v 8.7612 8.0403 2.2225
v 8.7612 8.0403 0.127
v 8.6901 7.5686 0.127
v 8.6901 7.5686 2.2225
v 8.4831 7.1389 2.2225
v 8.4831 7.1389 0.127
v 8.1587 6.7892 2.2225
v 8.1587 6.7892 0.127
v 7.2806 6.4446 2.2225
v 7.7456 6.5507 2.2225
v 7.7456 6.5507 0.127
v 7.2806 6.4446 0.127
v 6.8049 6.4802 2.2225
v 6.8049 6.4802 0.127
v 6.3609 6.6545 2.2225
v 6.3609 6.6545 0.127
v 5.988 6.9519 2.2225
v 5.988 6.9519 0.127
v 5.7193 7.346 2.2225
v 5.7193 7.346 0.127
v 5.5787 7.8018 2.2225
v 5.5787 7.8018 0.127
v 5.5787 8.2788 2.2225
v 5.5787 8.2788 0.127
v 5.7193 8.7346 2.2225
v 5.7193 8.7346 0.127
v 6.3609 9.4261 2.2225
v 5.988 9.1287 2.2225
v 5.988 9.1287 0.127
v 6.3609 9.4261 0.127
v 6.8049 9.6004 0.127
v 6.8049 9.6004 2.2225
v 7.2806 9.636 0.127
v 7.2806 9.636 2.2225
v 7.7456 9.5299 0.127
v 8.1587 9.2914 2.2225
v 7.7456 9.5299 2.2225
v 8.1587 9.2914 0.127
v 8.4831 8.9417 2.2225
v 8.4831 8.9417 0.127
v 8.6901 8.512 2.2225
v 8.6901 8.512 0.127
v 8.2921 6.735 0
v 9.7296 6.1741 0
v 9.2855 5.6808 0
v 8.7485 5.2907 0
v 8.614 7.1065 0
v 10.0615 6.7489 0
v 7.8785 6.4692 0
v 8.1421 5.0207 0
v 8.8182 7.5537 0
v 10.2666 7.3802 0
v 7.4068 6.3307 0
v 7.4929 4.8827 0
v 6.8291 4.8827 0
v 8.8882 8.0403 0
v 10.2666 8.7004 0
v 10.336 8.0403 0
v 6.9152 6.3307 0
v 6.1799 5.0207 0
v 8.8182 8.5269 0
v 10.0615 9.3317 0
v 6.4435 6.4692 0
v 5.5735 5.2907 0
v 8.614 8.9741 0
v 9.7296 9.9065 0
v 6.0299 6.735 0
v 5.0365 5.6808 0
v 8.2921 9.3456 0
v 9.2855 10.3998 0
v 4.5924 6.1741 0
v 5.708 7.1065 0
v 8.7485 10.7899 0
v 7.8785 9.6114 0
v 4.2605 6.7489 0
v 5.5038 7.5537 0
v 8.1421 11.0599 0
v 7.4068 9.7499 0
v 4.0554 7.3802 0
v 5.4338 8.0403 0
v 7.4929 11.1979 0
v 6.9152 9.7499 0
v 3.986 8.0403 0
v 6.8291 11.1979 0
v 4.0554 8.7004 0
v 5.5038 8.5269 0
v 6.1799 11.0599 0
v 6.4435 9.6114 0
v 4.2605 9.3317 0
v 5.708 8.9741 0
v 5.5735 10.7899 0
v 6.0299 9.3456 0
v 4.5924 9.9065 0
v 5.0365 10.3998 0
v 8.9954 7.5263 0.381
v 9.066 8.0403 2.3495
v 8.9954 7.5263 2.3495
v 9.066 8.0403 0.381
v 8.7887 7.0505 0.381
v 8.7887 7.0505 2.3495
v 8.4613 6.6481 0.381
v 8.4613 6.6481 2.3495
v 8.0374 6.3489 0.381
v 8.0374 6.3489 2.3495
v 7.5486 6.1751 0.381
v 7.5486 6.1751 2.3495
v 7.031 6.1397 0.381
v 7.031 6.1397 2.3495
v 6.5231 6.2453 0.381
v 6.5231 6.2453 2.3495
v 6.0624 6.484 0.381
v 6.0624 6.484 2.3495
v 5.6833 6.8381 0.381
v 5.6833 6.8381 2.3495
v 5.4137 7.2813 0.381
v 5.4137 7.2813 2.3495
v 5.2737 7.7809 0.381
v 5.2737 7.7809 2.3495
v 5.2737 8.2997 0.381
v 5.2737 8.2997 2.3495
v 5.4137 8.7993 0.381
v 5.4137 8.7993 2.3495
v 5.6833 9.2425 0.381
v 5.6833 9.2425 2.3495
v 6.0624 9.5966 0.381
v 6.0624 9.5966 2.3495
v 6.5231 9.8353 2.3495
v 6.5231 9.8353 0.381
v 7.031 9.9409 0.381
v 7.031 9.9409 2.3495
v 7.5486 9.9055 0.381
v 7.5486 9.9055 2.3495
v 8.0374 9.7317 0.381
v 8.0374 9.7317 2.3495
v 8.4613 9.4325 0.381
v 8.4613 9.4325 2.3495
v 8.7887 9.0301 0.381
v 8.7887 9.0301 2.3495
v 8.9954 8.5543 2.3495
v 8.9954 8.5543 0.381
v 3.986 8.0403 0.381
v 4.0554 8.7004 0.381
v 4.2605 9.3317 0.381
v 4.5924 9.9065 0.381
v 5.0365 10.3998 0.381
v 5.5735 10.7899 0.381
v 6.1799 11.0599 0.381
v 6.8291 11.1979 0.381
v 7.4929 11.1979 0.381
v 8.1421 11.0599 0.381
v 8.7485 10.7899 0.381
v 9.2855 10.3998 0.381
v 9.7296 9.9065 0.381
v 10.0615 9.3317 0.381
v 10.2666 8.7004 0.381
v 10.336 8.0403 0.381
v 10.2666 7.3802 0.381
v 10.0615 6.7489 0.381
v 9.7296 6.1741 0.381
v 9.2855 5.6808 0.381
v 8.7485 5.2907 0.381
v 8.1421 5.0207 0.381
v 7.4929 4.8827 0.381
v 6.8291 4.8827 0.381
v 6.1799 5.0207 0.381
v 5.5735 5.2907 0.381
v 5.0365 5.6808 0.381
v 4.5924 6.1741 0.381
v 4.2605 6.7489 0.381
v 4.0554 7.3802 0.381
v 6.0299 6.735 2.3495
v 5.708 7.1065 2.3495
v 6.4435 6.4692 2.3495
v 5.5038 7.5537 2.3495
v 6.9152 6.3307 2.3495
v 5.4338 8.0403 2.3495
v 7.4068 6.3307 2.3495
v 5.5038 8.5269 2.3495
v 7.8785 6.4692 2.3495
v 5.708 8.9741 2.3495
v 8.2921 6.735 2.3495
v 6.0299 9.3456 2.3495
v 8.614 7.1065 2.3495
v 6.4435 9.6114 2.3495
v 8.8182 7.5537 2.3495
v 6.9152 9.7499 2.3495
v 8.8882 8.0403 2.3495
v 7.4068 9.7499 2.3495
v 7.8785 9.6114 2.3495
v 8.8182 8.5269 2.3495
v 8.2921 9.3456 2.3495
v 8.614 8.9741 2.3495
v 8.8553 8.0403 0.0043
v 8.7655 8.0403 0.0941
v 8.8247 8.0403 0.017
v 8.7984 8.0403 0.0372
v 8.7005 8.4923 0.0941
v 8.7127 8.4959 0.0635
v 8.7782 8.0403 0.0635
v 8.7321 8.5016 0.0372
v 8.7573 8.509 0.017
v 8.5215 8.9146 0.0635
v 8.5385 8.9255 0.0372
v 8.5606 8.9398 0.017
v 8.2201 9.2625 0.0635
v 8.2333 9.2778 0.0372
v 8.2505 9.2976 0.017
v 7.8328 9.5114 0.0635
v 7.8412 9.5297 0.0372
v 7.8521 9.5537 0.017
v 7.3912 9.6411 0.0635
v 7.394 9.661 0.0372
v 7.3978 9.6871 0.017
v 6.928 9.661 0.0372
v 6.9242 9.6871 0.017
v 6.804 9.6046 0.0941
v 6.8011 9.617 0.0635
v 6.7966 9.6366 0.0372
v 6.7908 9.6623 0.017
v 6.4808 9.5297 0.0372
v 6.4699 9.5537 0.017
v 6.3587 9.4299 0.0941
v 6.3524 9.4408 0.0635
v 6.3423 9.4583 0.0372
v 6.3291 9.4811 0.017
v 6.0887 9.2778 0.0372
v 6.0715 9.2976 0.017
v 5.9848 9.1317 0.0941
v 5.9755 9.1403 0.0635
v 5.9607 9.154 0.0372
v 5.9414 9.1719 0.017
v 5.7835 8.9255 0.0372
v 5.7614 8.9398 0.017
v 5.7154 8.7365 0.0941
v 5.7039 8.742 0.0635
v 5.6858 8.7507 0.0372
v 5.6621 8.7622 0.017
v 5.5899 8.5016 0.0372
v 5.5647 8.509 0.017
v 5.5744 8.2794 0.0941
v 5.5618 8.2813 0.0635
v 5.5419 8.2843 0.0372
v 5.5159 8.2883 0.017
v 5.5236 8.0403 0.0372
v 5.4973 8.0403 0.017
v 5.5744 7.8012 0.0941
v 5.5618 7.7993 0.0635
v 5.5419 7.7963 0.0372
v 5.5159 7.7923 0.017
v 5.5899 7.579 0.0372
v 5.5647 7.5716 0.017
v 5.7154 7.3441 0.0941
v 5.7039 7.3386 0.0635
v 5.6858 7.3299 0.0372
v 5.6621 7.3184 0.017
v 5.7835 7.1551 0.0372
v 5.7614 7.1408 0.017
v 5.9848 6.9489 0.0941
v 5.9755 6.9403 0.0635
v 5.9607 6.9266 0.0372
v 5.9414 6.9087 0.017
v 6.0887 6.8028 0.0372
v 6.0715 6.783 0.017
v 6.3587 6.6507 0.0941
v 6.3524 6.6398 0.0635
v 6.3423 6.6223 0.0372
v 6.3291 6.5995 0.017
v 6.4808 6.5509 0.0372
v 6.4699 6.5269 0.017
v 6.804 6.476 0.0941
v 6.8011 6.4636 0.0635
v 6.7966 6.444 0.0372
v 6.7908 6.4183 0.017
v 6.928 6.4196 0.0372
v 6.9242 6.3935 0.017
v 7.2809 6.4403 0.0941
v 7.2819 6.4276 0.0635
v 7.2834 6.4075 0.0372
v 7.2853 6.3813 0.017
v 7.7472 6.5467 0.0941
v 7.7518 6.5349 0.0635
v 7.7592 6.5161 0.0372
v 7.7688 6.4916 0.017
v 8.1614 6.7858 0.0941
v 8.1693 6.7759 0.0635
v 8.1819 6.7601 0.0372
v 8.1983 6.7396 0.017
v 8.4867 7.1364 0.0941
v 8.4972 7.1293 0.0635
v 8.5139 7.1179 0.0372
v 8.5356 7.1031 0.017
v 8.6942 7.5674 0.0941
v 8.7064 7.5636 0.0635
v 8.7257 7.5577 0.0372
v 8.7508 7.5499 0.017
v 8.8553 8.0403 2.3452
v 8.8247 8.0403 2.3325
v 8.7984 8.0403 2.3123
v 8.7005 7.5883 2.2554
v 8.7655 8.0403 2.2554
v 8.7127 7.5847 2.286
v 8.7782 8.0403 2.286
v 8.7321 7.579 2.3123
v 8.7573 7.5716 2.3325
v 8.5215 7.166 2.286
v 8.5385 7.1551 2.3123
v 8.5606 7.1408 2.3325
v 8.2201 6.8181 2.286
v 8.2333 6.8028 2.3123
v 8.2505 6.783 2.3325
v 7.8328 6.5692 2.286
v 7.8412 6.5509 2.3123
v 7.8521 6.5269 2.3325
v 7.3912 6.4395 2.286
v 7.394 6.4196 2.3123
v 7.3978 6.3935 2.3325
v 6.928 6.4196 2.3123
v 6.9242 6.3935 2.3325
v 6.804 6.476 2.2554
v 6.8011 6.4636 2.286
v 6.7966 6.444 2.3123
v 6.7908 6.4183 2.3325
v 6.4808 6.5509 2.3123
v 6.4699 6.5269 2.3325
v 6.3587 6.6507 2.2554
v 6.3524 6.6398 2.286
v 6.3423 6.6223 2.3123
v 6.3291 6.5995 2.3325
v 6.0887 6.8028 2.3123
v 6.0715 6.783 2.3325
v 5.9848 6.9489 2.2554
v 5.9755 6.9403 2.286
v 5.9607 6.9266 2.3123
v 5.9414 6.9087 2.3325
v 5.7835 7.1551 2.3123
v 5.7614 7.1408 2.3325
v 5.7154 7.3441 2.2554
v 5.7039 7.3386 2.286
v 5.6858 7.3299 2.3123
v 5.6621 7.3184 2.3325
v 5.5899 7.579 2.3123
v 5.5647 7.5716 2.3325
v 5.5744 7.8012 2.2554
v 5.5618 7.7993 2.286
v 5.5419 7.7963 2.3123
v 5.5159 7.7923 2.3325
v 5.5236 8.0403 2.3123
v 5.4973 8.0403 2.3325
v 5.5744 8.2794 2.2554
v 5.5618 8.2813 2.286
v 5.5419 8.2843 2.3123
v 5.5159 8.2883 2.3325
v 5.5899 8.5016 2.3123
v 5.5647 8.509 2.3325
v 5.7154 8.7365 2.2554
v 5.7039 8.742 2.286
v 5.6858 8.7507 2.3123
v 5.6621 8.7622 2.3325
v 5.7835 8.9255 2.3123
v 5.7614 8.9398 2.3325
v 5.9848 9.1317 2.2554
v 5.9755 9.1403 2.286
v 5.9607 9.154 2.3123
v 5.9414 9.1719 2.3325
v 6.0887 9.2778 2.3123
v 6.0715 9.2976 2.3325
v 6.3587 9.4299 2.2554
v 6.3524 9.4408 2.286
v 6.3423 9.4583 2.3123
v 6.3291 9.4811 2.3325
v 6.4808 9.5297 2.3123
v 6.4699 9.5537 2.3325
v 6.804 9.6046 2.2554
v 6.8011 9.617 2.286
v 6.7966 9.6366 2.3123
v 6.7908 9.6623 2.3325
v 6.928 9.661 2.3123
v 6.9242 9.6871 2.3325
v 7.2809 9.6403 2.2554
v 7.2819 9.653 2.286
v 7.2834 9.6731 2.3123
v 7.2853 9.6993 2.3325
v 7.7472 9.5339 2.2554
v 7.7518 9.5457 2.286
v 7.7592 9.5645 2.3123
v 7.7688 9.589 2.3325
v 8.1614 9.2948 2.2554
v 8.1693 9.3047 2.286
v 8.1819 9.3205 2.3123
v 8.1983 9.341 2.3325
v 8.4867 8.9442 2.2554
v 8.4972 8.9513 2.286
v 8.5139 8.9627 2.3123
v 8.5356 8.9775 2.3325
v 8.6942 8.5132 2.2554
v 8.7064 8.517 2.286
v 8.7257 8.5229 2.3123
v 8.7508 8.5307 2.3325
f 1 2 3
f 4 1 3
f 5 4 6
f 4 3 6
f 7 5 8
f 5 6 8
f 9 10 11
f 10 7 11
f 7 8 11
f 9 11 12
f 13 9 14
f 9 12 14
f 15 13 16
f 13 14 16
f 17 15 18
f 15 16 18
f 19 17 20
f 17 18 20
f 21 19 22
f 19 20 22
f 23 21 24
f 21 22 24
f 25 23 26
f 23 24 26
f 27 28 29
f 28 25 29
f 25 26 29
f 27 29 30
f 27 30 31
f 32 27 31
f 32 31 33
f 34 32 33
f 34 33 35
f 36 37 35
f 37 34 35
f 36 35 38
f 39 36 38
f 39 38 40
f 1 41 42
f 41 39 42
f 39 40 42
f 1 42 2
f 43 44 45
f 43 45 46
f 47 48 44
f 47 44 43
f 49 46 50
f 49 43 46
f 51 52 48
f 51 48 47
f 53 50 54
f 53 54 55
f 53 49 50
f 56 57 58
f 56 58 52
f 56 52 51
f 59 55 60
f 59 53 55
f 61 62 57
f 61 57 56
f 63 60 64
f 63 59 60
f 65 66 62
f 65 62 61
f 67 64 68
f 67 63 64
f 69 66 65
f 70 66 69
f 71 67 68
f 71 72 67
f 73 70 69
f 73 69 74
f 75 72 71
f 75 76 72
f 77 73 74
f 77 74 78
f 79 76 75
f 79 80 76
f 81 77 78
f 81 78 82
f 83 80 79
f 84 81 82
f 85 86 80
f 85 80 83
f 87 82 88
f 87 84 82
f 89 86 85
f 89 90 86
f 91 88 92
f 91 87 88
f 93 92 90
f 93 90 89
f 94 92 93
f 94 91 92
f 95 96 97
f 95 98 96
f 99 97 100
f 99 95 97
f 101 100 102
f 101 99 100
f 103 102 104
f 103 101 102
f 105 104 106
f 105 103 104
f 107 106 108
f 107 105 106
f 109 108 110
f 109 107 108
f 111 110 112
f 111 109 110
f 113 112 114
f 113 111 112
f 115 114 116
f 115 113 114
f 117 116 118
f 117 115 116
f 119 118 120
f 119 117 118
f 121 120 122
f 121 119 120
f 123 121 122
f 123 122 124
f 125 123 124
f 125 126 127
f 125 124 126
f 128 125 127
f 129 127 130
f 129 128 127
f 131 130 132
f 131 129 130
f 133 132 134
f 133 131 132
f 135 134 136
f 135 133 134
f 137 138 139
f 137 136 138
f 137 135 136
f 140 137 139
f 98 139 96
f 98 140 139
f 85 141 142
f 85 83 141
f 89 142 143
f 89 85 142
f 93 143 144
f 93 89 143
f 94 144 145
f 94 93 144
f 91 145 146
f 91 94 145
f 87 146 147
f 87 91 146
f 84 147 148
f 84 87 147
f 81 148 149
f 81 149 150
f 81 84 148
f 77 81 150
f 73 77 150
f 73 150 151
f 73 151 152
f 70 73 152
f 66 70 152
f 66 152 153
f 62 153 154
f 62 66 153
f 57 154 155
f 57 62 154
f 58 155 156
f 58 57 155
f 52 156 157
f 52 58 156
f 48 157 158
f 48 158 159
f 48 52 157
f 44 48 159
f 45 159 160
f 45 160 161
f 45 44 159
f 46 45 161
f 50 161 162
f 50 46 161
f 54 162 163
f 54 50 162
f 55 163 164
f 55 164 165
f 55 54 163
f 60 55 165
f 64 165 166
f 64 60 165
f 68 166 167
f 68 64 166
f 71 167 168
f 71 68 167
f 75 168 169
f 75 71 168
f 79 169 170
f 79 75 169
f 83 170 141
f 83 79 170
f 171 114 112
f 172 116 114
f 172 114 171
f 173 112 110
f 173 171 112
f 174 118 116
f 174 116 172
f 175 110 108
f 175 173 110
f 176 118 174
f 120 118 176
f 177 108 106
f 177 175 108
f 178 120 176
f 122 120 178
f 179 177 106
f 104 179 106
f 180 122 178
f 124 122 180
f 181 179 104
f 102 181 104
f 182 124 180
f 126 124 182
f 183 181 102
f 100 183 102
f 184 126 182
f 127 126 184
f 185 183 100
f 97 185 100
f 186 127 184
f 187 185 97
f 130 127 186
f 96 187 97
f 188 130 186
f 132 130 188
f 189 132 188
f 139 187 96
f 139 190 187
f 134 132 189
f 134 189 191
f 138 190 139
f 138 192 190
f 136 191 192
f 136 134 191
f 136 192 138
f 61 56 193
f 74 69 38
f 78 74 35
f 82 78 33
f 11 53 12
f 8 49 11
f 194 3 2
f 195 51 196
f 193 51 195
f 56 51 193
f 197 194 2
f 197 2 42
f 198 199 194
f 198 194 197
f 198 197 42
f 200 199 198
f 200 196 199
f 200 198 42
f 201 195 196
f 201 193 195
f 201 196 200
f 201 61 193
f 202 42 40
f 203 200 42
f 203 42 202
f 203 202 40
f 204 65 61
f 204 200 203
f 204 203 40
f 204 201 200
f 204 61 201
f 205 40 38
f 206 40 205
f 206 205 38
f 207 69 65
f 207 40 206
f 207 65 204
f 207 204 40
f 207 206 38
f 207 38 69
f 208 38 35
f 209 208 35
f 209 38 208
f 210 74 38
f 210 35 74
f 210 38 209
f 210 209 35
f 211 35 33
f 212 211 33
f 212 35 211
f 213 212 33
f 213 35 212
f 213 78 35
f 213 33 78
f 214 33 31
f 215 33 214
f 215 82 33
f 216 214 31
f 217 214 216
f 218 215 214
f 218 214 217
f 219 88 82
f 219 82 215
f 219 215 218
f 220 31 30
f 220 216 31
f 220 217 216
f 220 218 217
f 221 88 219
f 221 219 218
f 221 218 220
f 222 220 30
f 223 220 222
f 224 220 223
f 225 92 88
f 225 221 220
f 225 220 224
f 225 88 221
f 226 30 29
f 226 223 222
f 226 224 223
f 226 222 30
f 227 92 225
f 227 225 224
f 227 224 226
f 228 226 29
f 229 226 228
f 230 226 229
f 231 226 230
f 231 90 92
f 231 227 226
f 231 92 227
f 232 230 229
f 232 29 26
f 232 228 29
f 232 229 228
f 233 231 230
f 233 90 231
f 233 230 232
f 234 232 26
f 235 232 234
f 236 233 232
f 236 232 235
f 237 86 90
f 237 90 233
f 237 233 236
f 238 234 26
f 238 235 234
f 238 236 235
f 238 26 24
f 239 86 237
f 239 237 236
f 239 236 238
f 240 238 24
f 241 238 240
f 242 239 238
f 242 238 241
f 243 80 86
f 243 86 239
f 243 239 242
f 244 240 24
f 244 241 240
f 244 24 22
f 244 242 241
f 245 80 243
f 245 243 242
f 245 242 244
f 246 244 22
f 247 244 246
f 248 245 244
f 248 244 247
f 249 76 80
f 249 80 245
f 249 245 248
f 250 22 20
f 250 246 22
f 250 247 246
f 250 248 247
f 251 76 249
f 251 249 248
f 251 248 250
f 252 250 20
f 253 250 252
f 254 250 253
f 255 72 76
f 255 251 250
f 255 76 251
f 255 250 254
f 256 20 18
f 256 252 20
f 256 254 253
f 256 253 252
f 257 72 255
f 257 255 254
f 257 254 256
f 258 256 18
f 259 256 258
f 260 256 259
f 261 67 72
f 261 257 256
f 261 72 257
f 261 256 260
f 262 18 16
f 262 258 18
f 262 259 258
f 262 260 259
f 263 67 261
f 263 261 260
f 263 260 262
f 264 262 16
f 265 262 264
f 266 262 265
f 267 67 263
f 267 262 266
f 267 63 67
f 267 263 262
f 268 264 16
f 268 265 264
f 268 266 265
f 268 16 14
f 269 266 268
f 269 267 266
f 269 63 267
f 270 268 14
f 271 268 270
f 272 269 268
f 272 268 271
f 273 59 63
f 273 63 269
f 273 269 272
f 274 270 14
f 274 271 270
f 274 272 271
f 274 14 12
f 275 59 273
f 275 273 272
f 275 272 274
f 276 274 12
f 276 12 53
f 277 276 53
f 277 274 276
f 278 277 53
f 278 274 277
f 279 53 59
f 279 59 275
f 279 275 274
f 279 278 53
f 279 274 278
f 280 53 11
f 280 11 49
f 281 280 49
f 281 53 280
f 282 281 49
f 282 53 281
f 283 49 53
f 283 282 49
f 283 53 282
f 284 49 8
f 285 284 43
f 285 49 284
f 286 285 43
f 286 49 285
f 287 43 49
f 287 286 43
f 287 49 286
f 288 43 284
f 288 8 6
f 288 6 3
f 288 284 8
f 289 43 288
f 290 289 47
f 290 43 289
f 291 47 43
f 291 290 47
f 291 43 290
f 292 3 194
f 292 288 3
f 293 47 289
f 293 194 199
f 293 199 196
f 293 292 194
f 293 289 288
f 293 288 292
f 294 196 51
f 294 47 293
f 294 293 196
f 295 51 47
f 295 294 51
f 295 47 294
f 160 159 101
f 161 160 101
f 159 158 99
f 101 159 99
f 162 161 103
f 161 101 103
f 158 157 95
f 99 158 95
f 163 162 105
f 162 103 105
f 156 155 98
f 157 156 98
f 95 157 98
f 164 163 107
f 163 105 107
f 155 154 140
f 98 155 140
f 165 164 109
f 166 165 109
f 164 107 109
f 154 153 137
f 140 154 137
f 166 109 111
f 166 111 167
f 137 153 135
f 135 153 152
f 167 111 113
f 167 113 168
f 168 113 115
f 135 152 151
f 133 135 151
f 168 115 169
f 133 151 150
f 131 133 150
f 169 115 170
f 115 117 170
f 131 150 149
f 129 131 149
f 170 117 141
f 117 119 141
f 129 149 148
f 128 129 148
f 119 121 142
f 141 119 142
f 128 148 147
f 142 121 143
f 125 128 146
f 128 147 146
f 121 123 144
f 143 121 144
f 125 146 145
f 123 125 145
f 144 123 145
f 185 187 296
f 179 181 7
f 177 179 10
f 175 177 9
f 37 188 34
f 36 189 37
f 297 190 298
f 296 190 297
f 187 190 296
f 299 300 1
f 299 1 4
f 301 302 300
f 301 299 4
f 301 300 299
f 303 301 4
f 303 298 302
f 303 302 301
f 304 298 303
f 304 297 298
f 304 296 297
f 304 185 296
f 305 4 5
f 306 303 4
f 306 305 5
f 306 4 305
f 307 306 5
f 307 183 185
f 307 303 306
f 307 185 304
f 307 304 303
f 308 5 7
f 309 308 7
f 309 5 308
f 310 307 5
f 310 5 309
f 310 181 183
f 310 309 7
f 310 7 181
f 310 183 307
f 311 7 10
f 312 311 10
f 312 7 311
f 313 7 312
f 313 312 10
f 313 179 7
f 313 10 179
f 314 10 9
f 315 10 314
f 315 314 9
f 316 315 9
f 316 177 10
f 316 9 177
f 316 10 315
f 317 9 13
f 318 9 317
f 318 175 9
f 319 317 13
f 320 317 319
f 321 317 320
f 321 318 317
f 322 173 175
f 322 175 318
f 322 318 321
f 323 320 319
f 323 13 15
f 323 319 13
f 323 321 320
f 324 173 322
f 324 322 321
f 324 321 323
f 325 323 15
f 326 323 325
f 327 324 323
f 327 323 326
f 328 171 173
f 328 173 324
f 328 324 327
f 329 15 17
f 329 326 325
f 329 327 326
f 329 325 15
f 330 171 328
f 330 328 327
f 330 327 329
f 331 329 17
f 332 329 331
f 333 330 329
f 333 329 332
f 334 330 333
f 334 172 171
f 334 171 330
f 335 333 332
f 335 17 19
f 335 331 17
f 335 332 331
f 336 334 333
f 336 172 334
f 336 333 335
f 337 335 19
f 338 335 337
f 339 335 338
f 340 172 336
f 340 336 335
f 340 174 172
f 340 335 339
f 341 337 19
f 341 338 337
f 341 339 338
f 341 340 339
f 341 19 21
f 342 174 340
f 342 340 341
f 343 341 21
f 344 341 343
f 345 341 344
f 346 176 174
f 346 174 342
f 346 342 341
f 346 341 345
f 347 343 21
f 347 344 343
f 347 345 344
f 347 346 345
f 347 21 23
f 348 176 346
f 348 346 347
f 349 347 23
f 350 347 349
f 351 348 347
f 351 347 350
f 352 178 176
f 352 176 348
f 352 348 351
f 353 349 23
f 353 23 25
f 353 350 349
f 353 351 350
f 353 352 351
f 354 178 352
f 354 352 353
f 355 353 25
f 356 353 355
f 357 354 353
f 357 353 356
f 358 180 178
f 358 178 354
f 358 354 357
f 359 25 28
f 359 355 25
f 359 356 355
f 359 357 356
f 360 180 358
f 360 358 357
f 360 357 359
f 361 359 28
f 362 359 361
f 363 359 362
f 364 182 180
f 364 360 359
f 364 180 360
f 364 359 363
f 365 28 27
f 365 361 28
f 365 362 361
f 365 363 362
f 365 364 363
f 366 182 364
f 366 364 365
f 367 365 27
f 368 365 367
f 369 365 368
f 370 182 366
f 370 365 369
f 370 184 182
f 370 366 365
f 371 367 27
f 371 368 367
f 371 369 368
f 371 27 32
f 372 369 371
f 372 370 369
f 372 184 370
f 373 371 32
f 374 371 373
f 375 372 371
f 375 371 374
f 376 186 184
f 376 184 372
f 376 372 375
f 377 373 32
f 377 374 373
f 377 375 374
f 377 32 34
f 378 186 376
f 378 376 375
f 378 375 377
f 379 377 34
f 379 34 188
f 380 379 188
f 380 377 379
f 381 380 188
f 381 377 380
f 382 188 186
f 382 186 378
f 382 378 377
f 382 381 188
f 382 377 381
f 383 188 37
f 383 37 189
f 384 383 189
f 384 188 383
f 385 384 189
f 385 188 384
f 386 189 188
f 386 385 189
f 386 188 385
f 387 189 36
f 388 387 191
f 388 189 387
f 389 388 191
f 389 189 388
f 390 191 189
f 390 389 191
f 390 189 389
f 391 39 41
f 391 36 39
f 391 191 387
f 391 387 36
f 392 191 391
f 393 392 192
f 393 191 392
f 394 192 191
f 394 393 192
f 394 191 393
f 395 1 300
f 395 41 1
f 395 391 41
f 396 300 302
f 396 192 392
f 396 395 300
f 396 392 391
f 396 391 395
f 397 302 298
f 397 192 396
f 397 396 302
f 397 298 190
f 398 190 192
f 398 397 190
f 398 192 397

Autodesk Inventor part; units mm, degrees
ref_plane "YZ Plane" through (0, 0, 0) normal (1, 0, 0) x (0, 1, 0)
ref_plane "XZ Plane" through (0, 0, 0) normal (0, 1, 0) x (-1, 0, 0)
ref_plane "XY Plane" through (0, 0, 0) normal (0, 0, 1) x (1, 0, 0)
sketch "Sketch1" plane through (0, 0, 0) normal (0, 0, 1) x (1, 0, 0)
  circle A0 centre (7.161, 8.0403) radius 1.524 projected
  line L0 (16.461, -12.7743) -> (16.461, -7.3635) projected
  arc A1 (16.461, -7.3635) -> (16.2925, -6.0336) centre (11.127, -7.3635) ccw projected
  line L1 (16.2925, -6.0336) -> (12.3265, 9.3703) projected
  arc A2 (12.3265, 9.3703) -> (7.161, 13.3743) centre (7.161, 8.0403) ccw projected
  line L2 (7.161, 13.3743) -> (-11.127, 13.3743) projected
  arc A3 (-11.127, 13.3743) -> (-16.461, 8.0403) centre (-11.127, 8.0403) ccw projected
  line L3 (-16.461, 8.0403) -> (-16.461, -8.0403) projected
  arc A4 (-16.461, -8.0403) -> (-11.127, -13.3743) centre (-11.127, -8.0403) ccw projected
  line L4 (-11.127, -13.3743) -> (15.861, -13.3743) projected
  arc A5 (15.861, -13.3743) -> (16.461, -12.7743) centre (15.861, -12.7743) ccw projected
  circle A6 centre (-11.127, 8.0403) radius 4.064 projected
  circle A7 centre (7.161, 8.0403) radius 1.6002
  circle A8 centre (7.161, 8.0403) radius 2.032 projected
  circle A9 centre (7.161, 8.0403) radius 1.905
  point P0 (0, 0)
  dimension "d0" = 0.0762
  dimension "d1" = 0.127
extrude "Extrusion1" add sketch "Sketch1" along normal blind 2.3495 contours A9
fillet "Fillet1" radius 0.127 2 edges at (5.5608, 8.0403, 2.3495) (5.5608, 8.0403, 0)
sketch "Sketch2" plane through (7.161, 8.0403, 0) normal (0, 0, -1) x (-1, 0, 0)
  circle A0 centre (0, 0) radius 1.905 projected
  circle A1 centre (0, 0) radius 3.175
  point P0 (7.161, -8.0403)
  dimension "d5" = 6.35
extrude "Extrusion2" add sketch "Sketch2" against normal blind 0.381
properties part number "M3Spacer"
